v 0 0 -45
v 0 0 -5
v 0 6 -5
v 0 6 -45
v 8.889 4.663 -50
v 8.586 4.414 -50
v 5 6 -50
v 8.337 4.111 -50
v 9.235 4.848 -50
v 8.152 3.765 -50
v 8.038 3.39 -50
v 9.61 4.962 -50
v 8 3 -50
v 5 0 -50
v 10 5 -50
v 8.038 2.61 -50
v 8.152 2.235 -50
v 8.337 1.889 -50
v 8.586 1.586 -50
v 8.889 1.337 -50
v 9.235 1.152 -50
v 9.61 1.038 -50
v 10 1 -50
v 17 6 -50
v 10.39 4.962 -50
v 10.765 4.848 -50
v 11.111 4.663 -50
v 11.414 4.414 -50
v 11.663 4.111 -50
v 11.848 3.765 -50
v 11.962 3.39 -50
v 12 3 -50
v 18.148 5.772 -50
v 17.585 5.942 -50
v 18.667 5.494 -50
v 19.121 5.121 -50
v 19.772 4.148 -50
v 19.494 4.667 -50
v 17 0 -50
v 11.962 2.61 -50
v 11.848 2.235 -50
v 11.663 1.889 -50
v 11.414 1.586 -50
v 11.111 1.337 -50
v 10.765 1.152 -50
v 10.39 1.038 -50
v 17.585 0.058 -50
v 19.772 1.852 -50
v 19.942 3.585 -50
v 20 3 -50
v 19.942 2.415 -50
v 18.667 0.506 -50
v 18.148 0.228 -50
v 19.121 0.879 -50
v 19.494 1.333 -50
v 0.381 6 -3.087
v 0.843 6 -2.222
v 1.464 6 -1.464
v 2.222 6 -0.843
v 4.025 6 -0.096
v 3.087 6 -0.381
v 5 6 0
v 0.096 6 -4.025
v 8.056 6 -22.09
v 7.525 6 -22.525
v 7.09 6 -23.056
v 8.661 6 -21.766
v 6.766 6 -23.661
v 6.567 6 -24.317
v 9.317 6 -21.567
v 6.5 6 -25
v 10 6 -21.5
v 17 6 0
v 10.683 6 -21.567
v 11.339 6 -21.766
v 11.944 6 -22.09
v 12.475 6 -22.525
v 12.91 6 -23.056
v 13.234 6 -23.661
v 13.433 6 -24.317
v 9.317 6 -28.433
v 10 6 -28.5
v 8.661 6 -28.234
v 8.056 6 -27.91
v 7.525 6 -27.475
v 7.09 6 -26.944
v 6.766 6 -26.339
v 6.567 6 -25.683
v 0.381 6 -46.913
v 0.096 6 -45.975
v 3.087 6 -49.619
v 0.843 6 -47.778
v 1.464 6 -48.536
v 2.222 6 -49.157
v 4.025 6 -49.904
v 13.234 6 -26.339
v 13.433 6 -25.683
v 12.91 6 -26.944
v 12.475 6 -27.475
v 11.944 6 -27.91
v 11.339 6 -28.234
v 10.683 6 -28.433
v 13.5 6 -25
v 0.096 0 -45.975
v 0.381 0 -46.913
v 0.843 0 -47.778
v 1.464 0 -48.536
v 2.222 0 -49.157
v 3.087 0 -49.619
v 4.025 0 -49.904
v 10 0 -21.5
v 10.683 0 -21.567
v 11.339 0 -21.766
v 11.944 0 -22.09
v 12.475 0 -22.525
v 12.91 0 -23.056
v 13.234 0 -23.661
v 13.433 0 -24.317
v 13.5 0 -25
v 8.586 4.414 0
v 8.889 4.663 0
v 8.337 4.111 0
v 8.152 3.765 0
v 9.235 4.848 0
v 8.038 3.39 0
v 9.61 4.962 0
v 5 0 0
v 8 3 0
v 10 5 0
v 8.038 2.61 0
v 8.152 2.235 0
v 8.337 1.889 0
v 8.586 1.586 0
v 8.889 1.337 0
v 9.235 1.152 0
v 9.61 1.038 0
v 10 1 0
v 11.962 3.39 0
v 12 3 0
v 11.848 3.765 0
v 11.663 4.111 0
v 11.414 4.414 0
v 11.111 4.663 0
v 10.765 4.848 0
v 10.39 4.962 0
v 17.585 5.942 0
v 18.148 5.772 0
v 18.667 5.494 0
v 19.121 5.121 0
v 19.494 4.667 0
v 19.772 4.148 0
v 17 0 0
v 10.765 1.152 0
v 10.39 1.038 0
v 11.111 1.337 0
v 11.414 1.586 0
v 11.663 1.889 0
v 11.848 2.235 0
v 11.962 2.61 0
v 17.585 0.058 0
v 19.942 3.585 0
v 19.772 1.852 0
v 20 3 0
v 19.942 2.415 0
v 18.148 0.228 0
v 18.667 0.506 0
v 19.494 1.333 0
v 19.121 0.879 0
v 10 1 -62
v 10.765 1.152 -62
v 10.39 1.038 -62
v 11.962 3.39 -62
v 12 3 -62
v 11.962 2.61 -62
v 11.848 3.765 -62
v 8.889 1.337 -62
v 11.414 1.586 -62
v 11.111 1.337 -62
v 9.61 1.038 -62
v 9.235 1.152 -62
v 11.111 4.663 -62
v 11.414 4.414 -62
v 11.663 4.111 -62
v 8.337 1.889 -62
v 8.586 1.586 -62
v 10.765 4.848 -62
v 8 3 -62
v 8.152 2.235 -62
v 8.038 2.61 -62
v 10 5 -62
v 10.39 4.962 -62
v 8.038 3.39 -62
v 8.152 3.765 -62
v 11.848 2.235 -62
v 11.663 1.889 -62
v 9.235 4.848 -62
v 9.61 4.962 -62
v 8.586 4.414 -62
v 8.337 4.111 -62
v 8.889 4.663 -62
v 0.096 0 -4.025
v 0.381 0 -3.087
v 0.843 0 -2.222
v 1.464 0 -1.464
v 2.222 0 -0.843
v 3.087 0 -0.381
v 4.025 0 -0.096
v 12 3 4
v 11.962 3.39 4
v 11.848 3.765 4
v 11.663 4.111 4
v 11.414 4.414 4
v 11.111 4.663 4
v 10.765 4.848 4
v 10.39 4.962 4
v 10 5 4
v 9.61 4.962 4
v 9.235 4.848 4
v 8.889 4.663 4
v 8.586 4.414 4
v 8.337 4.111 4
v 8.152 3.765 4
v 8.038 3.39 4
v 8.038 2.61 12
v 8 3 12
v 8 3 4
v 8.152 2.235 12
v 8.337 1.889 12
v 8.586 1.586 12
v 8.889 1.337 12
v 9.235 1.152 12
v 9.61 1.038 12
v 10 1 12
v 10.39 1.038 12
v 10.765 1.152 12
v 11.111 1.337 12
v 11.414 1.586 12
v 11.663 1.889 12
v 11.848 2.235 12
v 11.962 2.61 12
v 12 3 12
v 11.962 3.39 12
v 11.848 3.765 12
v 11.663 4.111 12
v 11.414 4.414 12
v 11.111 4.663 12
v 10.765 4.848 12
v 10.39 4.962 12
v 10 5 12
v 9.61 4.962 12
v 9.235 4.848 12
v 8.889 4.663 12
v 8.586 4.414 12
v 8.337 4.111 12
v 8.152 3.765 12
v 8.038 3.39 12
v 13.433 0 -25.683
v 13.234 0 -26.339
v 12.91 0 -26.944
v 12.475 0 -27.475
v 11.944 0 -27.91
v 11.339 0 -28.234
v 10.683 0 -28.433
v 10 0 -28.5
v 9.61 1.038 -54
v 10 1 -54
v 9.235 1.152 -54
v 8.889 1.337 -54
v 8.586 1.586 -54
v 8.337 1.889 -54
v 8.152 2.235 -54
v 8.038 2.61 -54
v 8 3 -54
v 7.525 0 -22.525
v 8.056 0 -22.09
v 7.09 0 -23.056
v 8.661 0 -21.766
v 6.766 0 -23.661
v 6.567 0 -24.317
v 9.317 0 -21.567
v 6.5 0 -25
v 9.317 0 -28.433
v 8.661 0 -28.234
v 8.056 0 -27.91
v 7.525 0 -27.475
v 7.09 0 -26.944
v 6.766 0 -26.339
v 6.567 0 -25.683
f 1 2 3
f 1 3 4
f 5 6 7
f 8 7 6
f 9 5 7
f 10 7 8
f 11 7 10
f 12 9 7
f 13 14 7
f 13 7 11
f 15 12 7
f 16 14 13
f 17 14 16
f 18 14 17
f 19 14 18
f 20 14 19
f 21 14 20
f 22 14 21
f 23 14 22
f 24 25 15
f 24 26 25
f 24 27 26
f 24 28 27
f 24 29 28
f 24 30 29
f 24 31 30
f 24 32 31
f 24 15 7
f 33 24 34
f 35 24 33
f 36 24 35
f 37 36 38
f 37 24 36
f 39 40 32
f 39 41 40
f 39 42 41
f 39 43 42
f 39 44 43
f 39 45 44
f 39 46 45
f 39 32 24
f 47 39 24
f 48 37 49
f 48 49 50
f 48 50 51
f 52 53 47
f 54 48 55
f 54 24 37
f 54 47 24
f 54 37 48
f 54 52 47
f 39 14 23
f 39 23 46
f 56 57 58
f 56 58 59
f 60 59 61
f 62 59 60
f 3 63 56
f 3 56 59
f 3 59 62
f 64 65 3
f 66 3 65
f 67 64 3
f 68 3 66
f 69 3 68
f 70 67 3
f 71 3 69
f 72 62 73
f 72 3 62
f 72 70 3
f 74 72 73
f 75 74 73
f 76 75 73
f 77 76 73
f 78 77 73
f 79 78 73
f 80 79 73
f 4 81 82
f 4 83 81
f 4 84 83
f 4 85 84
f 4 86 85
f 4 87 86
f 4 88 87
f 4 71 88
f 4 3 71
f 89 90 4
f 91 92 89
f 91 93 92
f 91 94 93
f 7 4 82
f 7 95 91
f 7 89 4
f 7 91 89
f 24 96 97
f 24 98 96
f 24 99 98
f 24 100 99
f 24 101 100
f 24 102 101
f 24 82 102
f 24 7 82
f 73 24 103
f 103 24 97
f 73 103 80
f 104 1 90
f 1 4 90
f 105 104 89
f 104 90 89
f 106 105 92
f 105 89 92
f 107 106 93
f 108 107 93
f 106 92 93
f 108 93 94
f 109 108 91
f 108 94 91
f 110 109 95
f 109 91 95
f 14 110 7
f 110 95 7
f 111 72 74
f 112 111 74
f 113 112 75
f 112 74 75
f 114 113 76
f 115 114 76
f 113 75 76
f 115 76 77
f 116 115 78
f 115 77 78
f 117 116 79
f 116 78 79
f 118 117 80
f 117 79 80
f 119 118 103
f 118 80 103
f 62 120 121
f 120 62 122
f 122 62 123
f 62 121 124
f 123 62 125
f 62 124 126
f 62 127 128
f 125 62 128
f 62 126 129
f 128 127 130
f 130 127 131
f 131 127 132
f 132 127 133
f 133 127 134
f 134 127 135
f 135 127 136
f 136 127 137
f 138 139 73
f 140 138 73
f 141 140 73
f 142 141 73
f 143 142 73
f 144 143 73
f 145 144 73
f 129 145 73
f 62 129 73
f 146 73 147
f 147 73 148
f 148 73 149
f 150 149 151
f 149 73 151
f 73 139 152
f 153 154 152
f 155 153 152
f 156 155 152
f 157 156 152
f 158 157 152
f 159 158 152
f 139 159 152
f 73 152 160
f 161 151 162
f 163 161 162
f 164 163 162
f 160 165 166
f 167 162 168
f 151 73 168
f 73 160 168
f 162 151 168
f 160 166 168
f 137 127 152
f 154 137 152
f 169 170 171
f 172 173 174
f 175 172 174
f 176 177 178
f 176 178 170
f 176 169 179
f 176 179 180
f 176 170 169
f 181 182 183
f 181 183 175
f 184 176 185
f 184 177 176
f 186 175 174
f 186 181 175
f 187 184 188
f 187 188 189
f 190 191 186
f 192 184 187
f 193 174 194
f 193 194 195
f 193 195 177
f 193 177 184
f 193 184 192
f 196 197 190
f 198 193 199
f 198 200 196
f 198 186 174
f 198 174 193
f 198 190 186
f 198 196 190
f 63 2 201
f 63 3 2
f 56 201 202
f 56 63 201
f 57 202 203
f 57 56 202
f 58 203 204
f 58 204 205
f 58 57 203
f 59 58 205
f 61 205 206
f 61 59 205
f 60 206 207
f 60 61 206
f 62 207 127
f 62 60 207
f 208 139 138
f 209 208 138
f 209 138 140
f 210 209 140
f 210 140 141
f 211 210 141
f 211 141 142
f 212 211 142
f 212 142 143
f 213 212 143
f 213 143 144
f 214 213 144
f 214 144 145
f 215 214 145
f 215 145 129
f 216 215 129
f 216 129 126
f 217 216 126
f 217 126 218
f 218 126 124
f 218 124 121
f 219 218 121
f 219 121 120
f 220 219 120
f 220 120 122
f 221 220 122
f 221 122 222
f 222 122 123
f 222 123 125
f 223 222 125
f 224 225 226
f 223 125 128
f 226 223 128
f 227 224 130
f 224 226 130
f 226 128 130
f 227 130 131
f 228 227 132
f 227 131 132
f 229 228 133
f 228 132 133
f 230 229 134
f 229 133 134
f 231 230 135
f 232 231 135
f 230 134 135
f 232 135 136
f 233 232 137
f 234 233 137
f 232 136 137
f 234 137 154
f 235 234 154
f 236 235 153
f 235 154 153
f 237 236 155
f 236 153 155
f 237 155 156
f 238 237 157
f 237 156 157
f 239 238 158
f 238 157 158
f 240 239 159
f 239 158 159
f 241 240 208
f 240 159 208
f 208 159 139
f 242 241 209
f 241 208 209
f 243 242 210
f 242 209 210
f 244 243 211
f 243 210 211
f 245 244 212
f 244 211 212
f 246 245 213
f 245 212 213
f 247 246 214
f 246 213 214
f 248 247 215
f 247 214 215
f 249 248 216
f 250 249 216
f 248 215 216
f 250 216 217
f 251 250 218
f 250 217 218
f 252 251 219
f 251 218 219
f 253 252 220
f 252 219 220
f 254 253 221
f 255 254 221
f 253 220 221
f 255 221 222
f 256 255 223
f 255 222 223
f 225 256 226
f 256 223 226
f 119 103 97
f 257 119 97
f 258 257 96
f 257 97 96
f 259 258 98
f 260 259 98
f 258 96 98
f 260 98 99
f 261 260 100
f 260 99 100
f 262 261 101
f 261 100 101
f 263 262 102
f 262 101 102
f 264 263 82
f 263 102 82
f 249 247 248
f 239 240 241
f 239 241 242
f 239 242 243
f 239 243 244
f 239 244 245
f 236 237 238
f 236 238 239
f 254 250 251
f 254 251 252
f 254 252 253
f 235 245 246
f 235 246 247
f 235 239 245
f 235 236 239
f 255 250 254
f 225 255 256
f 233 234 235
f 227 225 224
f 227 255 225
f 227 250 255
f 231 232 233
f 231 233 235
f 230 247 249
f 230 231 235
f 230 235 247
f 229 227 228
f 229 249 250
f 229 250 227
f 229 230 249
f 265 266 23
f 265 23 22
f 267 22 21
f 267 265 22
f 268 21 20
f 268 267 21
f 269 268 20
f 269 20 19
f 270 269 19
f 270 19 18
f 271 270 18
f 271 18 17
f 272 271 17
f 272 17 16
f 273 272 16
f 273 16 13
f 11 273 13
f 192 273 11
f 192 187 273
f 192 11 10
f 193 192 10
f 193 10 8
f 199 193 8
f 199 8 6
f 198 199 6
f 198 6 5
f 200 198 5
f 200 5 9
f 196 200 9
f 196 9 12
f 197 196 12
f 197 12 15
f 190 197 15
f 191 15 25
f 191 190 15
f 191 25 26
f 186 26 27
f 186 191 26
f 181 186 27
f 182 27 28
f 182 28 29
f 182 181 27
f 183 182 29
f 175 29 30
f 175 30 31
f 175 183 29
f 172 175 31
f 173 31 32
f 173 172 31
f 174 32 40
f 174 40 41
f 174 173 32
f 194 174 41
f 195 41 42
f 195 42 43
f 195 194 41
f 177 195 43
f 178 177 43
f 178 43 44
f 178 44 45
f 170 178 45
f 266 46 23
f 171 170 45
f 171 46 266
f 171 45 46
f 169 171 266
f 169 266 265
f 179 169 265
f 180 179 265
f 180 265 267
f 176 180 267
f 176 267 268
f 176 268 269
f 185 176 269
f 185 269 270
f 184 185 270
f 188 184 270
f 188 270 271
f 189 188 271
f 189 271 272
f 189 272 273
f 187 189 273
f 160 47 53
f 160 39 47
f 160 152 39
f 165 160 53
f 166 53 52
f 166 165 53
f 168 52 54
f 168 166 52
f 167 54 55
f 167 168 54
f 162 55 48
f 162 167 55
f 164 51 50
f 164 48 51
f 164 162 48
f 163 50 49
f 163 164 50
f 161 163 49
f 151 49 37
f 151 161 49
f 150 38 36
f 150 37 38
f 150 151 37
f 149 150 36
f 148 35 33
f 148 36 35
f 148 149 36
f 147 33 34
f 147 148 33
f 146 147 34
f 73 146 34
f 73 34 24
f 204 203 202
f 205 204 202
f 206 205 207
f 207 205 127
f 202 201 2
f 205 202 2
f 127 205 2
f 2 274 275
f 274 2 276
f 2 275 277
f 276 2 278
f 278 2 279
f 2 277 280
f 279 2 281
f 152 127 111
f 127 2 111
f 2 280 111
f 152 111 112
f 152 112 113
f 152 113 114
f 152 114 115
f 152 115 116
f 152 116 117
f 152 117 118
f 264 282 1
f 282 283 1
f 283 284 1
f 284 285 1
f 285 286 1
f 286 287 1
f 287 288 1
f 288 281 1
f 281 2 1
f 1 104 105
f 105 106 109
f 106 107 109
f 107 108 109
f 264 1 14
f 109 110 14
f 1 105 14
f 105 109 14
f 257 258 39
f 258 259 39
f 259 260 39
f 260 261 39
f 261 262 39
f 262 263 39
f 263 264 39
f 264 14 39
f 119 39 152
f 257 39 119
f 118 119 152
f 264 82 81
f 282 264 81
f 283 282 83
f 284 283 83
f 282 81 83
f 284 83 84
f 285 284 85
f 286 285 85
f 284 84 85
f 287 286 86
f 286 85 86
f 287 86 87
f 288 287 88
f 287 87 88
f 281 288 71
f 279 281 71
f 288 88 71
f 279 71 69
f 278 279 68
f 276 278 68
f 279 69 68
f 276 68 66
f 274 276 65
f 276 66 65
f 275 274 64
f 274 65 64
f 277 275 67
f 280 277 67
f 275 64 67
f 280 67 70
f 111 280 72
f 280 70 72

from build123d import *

# Parameters (mm, degrees)
SKETCH1_W           = 20
SKETCH1_H           = 50
BOSS_EXTRUDE1_DEPTH = 6
CUT_EXTRUDE1_DEPTH  = 55.184868737
BOSS_EXTRUDE2_DEPTH = 4
BOSS_EXTRUDE3_START = 4
BOSS_EXTRUDE3_DEPTH = 4
BOSS_EXTRUDE4_START = 1
SKETCH5_R           = 2
BOSS_EXTRUDE4_DEPTH = 1
SKETCH6_R           = 2
BOSS_EXTRUDE5_DEPTH = 1
FILLET1_R           = 5
FILLET2_R           = 5
FILLET3_RADIUS      = 3
FILLET3_LENGTH      = 50
BOSS_EXTRUDE6_START = 7
SKETCH7_R           = 2
BOSS_EXTRUDE6_DEPTH = 7
SKETCH8_R           = 2
BOSS_EXTRUDE7_DEPTH = 7


with BuildPart() as part:
    # Sketch1 → Boss-Extrude1 (new body)
    with BuildSketch(Plane(origin=(0, 0, 0), x_dir=(1, 0, 0), z_dir=(0, 1, 0))):
        with Locations((10, 25)):
            Rectangle(SKETCH1_W, SKETCH1_H)
    extrude(amount=BOSS_EXTRUDE1_DEPTH)

    # Sketch2 → Cut-Extrude1 (cut, through all)
    with BuildSketch(Plane(origin=(0, 6, 0), x_dir=(1, 0, 0), z_dir=(0, 1, 0))):
        with BuildLine():
            ThreePointArc((13.5, 25), (12.474873734, 27.474873734), (10, 28.5))
            Line((10, 28.5), (10, 21.5))
            ThreePointArc((10, 21.5), (12.474873734, 22.525126266), (13.5, 25))
        make_face()
        with BuildLine():
            Line((10, 21.5), (10, 28.5))
            ThreePointArc((10, 28.5), (6.5, 25), (10, 21.5))
        make_face()
    extrude(amount=-CUT_EXTRUDE1_DEPTH, mode=Mode.SUBTRACT)

    # Sketch3 → Boss-Extrude2 (add)
    with BuildSketch(Plane.XY):
        with BuildLine():
            ThreePointArc((12, 3), (11.414213562, 4.414213562), (10, 5))
            Line((10, 5), (10, 1))
            ThreePointArc((10, 1), (11.414213562, 1.585786438), (12, 3))
        make_face()
        with BuildLine():
            Line((10, 1), (10, 5))
            ThreePointArc((10, 5), (8, 3), (10, 1))
        make_face()
    extrude(amount=BOSS_EXTRUDE2_DEPTH)

    # Sketch4 → Boss-Extrude3 (add)
    with BuildSketch(Plane(origin=(0, 0, -50), x_dir=(-1, 0, 0), z_dir=(0, 0, -1)).offset(BOSS_EXTRUDE3_START)):
        with BuildLine():
            ThreePointArc((-8, 3), (-8.585786438, 4.414213562), (-10, 5))
            Line((-10, 5), (-10, 1))
            ThreePointArc((-10, 1), (-8.585786438, 1.585786438), (-8, 3))
        make_face()
        with BuildLine():
            Line((-10, 1), (-10, 5))
            ThreePointArc((-10, 5), (-12, 3), (-10, 1))
        make_face()
    extrude(amount=-BOSS_EXTRUDE3_DEPTH)

    # Sketch5 → Boss-Extrude4 (add)
    with BuildSketch(Plane(origin=(0, 0, -54), x_dir=(-1, 0, 0), z_dir=(0, 0, -1)).offset(BOSS_EXTRUDE4_START)):
        with Locations((-10, 3)):
            Circle(SKETCH5_R)
    extrude(amount=-BOSS_EXTRUDE4_DEPTH)

    # Sketch6 → Boss-Extrude5 (add)
    with BuildSketch(Plane.XY.offset(4)):
        with Locations(Location((10, 3, 0), (0, 0, 180))):
            Circle(SKETCH6_R)
    extrude(amount=BOSS_EXTRUDE5_DEPTH)

    # Fillet1
    fillet1_edges = [part.edges().sort_by_distance(p)[0] for p in [
        (0, 3, -50),
    ]]
    fillet(fillet1_edges, radius=FILLET1_R)

    # Fillet2
    fillet2_edges = [part.edges().sort_by_distance(p)[0] for p in [
        (0, 3, 0),
    ]]
    fillet(fillet2_edges, radius=FILLET2_R)

    # Fillet3: full round fillet: the end face becomes a half cylinder, R = half its width
    fillet3_face = Plane((20, 3, -25), x_dir=(0, 0, 1), z_dir=(1, 0, 0))  # on the end face: x along it, z out of the body
    fillet3_slab = fillet3_face.offset(-FILLET3_RADIUS / 2) * Box(FILLET3_LENGTH, 2 * FILLET3_RADIUS, FILLET3_RADIUS, mode=Mode.PRIVATE)  # the body's end, R deep
    fillet3_round = Plane((17, 3, -25), x_dir=(1, 0, 0), z_dir=(0, 0, 1)) * Cylinder(FILLET3_RADIUS, FILLET3_LENGTH, mode=Mode.PRIVATE)  # its axis R under the face
    add(fillet3_slab - fillet3_round, mode=Mode.SUBTRACT)

    # Sketch7 → Boss-Extrude6 (add)
    with BuildSketch(Plane(origin=(0, 0, -55), x_dir=(-1, 0, 0), z_dir=(0, 0, -1)).offset(BOSS_EXTRUDE6_START)):
        with Locations((-10, 3)):
            Circle(SKETCH7_R)
    extrude(amount=-BOSS_EXTRUDE6_DEPTH)

    # Sketch8 → Boss-Extrude7 (add)
    with BuildSketch(Plane.XY.offset(5)):
        with Locations(Location((10, 3, 0), (0, 0, 180))):
            Circle(SKETCH8_R)
    extrude(amount=BOSS_EXTRUDE7_DEPTH)


solid = part.part
